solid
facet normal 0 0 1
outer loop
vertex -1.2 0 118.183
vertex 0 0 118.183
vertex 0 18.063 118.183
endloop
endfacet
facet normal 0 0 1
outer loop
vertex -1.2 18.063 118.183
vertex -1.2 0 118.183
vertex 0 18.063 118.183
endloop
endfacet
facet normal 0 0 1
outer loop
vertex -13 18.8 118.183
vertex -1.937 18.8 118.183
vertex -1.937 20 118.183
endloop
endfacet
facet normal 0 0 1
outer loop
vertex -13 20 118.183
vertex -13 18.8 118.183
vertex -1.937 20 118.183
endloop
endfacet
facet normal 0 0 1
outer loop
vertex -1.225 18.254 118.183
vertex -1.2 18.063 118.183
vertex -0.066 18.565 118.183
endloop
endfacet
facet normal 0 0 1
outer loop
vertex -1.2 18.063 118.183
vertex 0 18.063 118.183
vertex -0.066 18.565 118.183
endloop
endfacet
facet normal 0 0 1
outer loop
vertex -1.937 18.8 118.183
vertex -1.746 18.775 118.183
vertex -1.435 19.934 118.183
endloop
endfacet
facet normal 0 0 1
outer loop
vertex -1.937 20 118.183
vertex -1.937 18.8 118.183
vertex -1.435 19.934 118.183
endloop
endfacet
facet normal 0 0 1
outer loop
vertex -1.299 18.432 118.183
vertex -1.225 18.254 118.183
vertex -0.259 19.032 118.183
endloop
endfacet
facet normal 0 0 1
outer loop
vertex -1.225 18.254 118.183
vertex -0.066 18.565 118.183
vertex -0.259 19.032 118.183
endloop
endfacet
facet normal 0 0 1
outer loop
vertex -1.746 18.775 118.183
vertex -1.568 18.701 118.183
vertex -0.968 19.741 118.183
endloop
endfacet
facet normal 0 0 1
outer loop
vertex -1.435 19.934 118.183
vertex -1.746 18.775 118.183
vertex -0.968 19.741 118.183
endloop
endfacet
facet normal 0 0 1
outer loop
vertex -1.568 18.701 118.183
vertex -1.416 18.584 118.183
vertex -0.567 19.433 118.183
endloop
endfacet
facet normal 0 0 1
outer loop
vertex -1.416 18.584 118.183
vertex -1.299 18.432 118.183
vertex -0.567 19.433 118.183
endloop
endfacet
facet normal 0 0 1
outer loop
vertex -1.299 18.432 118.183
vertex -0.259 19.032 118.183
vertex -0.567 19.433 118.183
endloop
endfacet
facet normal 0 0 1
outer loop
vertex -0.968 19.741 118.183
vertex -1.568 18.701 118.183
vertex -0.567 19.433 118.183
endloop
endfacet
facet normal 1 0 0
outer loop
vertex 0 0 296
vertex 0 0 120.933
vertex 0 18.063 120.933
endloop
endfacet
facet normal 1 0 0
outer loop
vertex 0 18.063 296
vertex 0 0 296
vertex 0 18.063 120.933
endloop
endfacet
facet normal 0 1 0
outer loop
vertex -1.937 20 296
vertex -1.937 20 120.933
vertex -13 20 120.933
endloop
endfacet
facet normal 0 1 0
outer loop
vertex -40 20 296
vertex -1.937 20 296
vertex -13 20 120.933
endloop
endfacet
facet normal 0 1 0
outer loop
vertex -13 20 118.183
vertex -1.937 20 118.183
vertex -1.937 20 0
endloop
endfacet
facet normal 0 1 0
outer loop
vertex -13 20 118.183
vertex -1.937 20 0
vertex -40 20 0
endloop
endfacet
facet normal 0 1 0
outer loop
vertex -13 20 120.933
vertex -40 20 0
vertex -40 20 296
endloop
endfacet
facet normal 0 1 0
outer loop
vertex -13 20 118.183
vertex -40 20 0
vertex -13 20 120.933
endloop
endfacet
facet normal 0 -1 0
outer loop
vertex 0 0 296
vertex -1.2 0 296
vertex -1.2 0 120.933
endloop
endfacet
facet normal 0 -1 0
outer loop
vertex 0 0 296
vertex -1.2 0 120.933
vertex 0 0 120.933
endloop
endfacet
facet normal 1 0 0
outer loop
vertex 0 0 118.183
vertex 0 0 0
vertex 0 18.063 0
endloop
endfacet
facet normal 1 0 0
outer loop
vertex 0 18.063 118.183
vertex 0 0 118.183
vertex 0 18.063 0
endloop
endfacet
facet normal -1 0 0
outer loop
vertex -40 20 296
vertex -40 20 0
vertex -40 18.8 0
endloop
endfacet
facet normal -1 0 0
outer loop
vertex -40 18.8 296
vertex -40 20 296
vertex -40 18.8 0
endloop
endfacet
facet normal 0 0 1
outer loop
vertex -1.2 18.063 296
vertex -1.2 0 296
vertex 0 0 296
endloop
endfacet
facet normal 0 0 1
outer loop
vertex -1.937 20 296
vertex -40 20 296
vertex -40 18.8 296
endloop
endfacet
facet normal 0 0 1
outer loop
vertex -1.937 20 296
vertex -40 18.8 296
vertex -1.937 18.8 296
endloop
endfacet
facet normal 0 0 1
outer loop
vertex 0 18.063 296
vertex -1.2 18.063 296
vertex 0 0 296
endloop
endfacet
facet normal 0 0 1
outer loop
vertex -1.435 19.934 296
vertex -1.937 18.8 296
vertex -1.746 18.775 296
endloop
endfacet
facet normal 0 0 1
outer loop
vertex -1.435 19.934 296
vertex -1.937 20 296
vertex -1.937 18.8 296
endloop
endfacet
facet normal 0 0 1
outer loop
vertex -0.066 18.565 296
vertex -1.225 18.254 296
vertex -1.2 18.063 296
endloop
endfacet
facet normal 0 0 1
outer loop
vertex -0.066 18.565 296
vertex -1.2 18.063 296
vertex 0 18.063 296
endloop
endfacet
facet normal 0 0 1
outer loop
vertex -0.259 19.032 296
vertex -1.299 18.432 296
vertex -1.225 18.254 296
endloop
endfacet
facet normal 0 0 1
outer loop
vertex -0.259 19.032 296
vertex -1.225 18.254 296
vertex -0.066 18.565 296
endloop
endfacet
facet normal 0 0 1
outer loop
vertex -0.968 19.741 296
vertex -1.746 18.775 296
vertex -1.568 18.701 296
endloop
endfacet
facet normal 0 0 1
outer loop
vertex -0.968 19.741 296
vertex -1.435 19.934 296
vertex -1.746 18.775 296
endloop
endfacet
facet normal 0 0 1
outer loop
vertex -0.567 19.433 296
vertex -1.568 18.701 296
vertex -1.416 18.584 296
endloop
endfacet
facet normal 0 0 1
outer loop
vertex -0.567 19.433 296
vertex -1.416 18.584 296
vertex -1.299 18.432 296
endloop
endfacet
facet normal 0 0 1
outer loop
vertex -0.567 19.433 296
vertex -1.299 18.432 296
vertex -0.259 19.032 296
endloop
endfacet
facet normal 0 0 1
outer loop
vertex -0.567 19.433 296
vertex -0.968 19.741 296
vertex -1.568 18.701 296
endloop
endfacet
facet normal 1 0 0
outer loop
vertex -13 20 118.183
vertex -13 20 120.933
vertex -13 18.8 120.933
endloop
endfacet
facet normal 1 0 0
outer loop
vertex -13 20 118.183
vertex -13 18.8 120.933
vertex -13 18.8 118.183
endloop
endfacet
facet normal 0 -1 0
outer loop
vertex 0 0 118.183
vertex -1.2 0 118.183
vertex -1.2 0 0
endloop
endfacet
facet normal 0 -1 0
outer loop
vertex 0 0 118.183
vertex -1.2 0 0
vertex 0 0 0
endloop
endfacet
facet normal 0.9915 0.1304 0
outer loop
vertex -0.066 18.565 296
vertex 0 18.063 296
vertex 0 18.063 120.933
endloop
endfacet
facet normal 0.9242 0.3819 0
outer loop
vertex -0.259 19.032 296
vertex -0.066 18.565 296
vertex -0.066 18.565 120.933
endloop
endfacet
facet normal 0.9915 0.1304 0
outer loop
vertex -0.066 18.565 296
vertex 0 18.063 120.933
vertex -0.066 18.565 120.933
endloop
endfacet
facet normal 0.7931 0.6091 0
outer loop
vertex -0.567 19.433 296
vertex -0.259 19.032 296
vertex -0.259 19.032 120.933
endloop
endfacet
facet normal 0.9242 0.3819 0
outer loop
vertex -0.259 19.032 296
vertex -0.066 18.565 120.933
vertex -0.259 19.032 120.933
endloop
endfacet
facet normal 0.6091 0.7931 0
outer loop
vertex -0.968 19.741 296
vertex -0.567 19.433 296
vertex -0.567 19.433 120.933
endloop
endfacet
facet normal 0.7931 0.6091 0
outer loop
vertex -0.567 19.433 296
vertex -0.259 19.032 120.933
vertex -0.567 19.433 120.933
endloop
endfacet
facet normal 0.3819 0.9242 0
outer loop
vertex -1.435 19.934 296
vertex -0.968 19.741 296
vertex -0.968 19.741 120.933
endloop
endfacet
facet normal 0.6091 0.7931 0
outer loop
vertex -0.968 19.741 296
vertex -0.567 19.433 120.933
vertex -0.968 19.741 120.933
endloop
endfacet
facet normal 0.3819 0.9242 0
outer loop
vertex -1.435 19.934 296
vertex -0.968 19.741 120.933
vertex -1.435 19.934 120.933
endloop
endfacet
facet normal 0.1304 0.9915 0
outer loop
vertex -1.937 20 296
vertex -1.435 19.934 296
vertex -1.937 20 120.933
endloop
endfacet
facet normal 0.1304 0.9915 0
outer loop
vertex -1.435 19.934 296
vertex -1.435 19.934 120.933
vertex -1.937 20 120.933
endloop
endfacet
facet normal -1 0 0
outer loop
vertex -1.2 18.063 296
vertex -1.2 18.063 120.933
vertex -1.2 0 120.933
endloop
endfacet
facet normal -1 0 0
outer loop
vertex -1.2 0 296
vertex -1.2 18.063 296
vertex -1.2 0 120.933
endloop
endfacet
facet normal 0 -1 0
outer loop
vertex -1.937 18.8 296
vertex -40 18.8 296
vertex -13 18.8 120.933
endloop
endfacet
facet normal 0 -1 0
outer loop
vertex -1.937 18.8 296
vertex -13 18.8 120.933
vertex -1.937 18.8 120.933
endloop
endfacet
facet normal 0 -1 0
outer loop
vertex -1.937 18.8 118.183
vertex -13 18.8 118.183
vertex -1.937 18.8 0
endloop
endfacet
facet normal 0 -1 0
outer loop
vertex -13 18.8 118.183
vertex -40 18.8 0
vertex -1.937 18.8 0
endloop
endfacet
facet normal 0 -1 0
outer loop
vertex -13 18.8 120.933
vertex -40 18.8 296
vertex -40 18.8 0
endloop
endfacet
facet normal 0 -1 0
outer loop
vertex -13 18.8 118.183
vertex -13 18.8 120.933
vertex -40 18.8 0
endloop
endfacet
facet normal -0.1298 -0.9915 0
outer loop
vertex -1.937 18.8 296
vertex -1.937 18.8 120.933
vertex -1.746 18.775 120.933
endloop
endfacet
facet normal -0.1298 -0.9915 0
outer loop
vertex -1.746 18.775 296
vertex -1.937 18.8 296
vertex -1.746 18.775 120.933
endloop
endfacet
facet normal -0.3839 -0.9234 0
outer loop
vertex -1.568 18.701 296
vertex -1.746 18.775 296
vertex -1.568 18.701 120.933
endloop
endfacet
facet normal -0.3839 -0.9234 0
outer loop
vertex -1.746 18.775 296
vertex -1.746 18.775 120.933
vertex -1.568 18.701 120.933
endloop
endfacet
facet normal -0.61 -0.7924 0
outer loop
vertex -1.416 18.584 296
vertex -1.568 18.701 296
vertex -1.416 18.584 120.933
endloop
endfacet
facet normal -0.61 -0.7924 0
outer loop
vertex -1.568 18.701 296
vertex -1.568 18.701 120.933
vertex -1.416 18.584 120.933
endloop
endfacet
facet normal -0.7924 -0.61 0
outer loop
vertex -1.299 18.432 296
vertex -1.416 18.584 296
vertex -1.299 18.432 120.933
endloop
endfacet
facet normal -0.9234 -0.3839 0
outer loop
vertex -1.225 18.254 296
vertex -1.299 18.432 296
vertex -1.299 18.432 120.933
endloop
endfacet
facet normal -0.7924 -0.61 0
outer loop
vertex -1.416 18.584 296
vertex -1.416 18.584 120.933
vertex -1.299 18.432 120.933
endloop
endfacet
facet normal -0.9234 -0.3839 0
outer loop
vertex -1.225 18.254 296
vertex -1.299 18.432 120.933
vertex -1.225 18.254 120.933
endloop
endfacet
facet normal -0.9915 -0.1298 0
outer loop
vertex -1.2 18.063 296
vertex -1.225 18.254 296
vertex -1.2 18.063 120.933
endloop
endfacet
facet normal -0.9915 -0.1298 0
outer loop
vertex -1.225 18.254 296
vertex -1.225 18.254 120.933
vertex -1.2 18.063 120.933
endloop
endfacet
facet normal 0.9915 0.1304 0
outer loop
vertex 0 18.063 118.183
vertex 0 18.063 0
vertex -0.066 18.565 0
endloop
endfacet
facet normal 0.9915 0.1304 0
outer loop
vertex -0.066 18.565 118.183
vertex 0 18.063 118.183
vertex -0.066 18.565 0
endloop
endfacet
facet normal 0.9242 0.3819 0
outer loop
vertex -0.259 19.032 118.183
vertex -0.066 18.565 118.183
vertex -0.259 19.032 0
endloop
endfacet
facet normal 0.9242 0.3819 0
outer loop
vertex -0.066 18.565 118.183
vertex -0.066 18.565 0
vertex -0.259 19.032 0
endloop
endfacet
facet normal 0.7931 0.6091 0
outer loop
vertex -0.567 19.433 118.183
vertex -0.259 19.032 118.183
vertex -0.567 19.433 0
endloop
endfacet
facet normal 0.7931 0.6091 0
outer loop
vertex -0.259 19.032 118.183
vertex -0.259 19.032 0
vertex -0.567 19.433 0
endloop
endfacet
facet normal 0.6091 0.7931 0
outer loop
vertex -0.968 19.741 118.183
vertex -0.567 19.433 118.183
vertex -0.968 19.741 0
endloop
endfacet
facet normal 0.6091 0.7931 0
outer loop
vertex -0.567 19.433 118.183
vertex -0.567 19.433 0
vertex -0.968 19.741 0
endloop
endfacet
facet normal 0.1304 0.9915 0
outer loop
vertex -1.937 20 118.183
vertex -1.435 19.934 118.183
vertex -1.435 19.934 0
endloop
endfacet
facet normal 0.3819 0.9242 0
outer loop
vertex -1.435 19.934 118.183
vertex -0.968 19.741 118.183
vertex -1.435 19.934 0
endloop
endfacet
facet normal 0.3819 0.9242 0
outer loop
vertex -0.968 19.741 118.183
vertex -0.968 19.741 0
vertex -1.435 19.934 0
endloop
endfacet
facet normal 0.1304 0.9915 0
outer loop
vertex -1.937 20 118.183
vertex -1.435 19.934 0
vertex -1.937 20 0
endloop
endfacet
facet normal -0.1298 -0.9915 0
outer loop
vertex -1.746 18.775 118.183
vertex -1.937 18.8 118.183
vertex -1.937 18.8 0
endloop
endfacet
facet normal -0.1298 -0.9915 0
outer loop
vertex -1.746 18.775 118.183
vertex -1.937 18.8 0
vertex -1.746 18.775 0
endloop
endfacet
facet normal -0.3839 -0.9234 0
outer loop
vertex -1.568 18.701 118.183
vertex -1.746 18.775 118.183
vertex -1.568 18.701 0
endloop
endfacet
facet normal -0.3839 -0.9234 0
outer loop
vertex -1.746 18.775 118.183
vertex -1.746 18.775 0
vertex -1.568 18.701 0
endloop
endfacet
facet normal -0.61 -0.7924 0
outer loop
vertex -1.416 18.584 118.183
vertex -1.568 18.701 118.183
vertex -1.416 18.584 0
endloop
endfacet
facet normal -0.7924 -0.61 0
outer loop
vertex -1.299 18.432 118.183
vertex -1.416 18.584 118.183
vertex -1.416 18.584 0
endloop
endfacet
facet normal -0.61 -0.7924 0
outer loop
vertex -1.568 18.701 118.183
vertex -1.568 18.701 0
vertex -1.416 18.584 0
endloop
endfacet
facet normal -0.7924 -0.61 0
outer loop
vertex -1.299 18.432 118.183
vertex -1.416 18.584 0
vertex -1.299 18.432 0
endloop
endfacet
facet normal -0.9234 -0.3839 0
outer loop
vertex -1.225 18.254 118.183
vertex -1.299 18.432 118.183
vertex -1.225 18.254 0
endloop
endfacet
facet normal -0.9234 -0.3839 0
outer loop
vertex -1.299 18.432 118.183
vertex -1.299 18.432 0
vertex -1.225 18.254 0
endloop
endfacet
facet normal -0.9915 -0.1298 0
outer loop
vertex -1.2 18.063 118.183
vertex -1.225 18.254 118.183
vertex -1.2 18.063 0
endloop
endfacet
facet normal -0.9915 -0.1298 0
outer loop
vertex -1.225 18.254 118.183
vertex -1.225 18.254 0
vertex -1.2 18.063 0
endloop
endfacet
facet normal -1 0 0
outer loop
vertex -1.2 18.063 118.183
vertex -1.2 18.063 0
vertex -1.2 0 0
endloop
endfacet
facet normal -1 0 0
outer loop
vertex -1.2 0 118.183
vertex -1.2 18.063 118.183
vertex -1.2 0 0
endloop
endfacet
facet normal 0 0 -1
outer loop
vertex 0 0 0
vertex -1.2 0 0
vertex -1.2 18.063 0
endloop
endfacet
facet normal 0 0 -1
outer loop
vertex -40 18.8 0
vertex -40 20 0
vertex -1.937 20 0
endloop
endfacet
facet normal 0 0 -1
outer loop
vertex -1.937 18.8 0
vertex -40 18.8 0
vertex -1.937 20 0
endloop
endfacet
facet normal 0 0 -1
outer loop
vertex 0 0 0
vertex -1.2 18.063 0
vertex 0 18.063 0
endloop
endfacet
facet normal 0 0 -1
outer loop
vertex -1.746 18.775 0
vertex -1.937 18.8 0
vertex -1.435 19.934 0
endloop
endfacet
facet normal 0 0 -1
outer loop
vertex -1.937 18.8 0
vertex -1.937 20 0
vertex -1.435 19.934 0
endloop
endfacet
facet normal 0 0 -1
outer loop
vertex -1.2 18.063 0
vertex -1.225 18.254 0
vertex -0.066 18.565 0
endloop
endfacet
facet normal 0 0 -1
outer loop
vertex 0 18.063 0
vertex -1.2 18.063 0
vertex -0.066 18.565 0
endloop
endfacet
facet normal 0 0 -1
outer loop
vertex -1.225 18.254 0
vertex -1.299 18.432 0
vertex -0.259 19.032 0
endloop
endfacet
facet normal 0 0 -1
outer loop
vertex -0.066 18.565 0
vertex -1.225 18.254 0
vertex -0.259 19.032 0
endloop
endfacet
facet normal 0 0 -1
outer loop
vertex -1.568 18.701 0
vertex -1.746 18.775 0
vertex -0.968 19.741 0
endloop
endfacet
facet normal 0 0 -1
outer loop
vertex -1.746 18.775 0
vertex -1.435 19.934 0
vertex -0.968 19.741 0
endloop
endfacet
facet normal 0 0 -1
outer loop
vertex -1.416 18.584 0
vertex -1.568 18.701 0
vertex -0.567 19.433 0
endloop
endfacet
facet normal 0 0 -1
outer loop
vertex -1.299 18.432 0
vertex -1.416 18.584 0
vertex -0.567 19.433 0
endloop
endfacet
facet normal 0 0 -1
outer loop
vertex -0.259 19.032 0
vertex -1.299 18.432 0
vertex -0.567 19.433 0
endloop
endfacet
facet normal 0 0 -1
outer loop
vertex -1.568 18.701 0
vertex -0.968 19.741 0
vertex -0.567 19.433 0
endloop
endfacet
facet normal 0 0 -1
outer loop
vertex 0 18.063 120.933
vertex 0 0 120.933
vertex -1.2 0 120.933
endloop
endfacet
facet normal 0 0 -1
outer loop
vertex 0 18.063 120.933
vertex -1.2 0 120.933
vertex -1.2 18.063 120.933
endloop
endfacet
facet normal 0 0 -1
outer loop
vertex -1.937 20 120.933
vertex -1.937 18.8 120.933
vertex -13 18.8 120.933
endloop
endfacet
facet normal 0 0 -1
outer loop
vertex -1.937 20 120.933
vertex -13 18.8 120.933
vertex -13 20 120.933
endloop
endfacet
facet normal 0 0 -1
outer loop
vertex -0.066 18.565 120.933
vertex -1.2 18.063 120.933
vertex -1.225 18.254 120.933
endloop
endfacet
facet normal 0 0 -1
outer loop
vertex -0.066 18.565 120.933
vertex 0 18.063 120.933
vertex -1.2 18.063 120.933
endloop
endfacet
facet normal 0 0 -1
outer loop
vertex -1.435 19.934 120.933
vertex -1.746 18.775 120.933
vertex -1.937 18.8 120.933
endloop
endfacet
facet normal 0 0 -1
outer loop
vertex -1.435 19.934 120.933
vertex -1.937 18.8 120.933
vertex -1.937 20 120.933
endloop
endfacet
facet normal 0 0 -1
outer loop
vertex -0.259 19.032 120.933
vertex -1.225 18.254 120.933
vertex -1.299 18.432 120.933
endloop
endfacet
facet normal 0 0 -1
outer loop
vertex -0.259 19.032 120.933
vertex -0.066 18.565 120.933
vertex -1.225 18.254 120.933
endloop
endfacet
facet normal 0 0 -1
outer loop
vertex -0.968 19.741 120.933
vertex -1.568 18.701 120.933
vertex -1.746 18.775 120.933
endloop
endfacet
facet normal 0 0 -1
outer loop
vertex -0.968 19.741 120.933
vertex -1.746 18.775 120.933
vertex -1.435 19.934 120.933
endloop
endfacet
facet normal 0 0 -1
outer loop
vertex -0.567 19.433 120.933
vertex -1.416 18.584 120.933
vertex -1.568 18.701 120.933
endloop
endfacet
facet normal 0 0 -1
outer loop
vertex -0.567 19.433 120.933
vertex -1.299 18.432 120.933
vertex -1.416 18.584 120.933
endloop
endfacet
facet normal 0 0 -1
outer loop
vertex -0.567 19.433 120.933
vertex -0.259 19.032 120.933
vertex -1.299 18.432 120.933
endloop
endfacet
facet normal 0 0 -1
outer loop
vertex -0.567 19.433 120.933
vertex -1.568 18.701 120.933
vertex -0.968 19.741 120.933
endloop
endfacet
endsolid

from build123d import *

# Parameters (mm, degrees)
BASE_FLANGE1_DEPTH = 296
SKETCH2_W          = 2.75
SKETCH2_H          = 20.5
CUT_EXTRUDE1_DEPTH = 13


# Sheet-metal steps are written as plain solids
with BuildPart() as part:
    # Sketch1 → Base-Flange1 (new body)
    with BuildSketch(Plane.XY):
        with BuildLine():
            Line((0, 0), (0, 18.0634))
            ThreePointArc((0, 18.0634), (-0.567217008, 19.432782992), (-1.9366, 20))
            Line((-1.9366, 20), (-40, 20))
            Line((-40, 20), (-40, 18.8))
            Line((-40, 18.8), (-1.9366, 18.8))
            ThreePointArc((-1.9366, 18.8), (-1.415745145, 18.584254855), (-1.2, 18.0634))
            Line((-1.2, 18.0634), (-1.2, 0))
            Line((-1.2, 0), (0, 0))
        make_face()
    extrude(amount=BASE_FLANGE1_DEPTH)

    # Sketch2 → Cut-Extrude1 (cut)
    with BuildSketch(Plane(origin=(0, 0, 0), x_dir=(0, 0, -1), z_dir=(1, 0, 0))):
        with Locations((-119.558385949, 9.989549108)):
            Rectangle(SKETCH2_W, SKETCH2_H)
    extrude(amount=-CUT_EXTRUDE1_DEPTH, mode=Mode.SUBTRACT)


solid = part.part
